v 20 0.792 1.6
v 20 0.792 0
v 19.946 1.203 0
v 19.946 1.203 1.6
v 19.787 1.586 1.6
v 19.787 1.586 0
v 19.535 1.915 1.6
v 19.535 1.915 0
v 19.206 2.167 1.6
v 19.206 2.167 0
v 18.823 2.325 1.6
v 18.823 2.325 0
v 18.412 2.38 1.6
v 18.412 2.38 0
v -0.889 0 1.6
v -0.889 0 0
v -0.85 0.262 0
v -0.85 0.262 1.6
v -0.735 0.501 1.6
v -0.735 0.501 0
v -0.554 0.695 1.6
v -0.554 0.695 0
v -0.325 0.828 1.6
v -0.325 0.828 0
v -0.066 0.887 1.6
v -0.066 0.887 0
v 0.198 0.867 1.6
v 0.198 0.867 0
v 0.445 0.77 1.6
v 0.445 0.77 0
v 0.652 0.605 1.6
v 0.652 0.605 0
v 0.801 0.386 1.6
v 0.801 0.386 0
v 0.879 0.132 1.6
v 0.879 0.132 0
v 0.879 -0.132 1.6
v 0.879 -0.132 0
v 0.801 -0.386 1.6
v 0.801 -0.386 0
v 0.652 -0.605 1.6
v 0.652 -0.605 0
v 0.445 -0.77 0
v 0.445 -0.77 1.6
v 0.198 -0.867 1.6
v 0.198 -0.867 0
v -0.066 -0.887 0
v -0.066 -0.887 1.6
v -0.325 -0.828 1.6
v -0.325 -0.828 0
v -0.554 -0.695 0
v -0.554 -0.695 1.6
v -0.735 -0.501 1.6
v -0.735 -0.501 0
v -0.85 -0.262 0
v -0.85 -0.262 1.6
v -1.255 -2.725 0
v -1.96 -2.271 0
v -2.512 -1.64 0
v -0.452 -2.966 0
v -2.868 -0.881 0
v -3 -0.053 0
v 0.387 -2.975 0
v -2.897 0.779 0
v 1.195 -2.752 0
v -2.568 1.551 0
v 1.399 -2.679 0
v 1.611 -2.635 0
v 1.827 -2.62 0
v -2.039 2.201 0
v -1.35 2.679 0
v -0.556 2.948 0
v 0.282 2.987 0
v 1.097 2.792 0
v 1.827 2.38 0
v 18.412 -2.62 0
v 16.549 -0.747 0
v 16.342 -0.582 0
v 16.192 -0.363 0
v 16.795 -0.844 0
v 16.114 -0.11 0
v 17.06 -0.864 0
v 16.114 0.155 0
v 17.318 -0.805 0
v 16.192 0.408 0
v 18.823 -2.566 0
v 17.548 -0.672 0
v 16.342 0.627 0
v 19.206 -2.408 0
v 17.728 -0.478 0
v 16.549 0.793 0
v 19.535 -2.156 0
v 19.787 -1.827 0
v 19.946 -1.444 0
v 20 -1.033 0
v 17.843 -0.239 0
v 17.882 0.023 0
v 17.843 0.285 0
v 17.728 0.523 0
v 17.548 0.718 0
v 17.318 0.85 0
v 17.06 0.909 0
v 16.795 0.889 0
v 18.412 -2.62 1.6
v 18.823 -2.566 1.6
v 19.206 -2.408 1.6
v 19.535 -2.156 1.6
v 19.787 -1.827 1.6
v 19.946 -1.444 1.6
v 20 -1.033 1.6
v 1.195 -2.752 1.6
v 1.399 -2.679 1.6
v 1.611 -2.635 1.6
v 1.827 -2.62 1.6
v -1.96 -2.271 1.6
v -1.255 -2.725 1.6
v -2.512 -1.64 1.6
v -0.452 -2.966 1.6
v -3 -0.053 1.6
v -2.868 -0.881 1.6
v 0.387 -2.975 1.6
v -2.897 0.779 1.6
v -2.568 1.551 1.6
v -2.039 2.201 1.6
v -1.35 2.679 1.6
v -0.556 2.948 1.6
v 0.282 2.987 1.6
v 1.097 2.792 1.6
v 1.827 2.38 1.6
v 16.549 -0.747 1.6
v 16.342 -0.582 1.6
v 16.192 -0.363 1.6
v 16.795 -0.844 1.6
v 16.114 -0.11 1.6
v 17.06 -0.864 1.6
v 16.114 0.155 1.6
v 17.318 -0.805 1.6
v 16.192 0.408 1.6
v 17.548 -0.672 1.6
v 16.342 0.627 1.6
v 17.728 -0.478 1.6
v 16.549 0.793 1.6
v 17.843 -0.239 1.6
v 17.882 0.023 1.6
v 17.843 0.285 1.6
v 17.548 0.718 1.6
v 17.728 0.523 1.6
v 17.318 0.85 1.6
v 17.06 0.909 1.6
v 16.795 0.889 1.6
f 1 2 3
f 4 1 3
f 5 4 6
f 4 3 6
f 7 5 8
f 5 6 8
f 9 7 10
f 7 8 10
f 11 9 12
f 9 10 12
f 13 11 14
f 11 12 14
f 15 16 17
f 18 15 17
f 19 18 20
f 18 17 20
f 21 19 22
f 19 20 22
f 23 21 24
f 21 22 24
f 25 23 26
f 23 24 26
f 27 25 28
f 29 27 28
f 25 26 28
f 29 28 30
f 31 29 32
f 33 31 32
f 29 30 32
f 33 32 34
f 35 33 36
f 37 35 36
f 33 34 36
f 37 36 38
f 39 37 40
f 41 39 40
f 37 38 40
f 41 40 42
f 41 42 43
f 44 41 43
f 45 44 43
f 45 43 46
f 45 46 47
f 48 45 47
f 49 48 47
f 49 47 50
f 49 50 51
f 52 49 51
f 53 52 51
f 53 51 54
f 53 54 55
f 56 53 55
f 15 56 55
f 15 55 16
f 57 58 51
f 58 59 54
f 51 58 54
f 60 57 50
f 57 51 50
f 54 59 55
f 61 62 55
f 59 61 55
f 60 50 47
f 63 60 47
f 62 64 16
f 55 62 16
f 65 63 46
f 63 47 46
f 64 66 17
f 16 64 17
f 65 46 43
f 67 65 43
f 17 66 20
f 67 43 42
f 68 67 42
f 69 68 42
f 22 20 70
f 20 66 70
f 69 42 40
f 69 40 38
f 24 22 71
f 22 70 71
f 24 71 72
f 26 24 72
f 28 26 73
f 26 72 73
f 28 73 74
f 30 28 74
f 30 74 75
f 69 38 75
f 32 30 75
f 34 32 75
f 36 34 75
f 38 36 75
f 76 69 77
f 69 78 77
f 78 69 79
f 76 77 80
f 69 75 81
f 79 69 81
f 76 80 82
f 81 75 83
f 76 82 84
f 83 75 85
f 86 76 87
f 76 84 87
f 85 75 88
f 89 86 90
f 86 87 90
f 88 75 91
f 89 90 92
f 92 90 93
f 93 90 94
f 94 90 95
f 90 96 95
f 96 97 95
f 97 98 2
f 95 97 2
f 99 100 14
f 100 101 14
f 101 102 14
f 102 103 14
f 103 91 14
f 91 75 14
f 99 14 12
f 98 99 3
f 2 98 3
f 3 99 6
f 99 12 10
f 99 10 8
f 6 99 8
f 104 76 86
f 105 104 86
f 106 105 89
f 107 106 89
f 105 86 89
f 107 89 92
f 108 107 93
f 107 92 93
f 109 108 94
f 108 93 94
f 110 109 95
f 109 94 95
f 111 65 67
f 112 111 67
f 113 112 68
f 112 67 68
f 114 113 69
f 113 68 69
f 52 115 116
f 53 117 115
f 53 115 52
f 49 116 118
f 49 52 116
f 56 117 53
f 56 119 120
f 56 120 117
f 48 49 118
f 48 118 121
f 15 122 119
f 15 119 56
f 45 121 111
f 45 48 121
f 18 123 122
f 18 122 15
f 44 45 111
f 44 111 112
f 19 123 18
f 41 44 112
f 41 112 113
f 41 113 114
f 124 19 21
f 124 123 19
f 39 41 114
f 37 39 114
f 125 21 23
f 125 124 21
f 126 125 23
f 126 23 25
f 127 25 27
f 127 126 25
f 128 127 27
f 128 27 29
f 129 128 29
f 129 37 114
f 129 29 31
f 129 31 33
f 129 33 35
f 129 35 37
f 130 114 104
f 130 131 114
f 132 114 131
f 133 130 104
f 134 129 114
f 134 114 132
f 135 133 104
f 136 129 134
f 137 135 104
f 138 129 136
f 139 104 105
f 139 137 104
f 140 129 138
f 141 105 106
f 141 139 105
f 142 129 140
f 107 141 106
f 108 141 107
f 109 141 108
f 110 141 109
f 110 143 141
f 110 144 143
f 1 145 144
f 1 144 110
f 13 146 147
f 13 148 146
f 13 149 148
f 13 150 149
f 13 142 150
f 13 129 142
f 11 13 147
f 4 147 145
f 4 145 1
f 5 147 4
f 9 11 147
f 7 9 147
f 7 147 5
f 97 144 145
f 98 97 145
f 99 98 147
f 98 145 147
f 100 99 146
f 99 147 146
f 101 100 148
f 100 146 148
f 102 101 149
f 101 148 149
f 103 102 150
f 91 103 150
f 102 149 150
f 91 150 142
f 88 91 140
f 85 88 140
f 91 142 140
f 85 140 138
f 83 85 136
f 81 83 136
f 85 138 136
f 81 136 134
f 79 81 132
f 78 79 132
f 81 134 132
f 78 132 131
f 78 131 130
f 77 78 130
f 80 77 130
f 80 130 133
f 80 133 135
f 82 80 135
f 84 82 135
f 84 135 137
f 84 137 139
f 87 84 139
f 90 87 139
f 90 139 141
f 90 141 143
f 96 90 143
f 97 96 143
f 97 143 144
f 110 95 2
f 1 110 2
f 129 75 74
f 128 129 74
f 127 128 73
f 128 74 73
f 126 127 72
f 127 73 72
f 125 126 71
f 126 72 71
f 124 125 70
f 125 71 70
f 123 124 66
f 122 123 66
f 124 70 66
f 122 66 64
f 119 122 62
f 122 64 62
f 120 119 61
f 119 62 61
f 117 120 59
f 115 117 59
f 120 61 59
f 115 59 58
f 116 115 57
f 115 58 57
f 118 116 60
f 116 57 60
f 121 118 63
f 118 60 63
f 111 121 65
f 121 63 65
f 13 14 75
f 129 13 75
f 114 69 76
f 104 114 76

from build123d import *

# Parameters (mm, degrees)
BOSS_EXTRUDE1_DEPTH       = 1.6002
F_0_CLEARANCE_HOLE1_D     = 1.778
F_0_CLEARANCE_HOLE1_DEPTH = 465
F_0_CLEARANCE_HOLE1_TIP   = 0.53416509
F_0_CLEARANCE_HOLE2_D     = 1.778
F_0_CLEARANCE_HOLE2_DEPTH = 465
F_0_CLEARANCE_HOLE2_TIP   = 0.53416509


with BuildPart() as part:
    # Sketch1 → Boss-Extrude1 (new body)
    with BuildSketch(Plane.XY):
        with BuildLine():
            Line((1.827005239, -2.620493359), (18.4125, -2.620493359))
            ThreePointArc((18.4125, -2.620493359), (19.535032015, -2.155525374), (20, -1.032993359))
            Line((20, -1.032993359), (20, 0.792006641))
            ThreePointArc((20, 0.792006641), (19.535032015, 1.914538656), (18.4125, 2.379506641))
            Line((18.4125, 2.379506641), (1.827005239, 2.379506641))
            ThreePointArc((1.827005239, 2.379506641), (-2.977484791, 0.366857357), (1.194771818, -2.75182127))
            ThreePointArc((1.194771818, -2.75182127), (1.504140671, -2.653672053), (1.827005239, -2.620493359))
        make_face()
    extrude(amount=BOSS_EXTRUDE1_DEPTH)

    # #0 Clearance Hole1
    with Locations(Plane.XY.offset(1.6002)):
        with Locations((0, 0)):
            Hole(F_0_CLEARANCE_HOLE1_D / 2, depth=F_0_CLEARANCE_HOLE1_DEPTH)
            with Locations((0, 0, -(F_0_CLEARANCE_HOLE1_DEPTH + F_0_CLEARANCE_HOLE1_TIP / 2))):  # 118° drill point
                Cone(0, F_0_CLEARANCE_HOLE1_D / 2, F_0_CLEARANCE_HOLE1_TIP, mode=Mode.SUBTRACT)

    # #0 Clearance Hole2
    with Locations(Plane(origin=(0, 0, 0), x_dir=(-1, 0, 0), z_dir=(0, 0, -1))):
        with Locations((-16.993218834, 0.022656086)):
            Hole(F_0_CLEARANCE_HOLE2_D / 2, depth=F_0_CLEARANCE_HOLE2_DEPTH)
            with Locations((0, 0, -(F_0_CLEARANCE_HOLE2_DEPTH + F_0_CLEARANCE_HOLE2_TIP / 2))):  # 118° drill point
                Cone(0, F_0_CLEARANCE_HOLE2_D / 2, F_0_CLEARANCE_HOLE2_TIP, mode=Mode.SUBTRACT)


solid = part.part
